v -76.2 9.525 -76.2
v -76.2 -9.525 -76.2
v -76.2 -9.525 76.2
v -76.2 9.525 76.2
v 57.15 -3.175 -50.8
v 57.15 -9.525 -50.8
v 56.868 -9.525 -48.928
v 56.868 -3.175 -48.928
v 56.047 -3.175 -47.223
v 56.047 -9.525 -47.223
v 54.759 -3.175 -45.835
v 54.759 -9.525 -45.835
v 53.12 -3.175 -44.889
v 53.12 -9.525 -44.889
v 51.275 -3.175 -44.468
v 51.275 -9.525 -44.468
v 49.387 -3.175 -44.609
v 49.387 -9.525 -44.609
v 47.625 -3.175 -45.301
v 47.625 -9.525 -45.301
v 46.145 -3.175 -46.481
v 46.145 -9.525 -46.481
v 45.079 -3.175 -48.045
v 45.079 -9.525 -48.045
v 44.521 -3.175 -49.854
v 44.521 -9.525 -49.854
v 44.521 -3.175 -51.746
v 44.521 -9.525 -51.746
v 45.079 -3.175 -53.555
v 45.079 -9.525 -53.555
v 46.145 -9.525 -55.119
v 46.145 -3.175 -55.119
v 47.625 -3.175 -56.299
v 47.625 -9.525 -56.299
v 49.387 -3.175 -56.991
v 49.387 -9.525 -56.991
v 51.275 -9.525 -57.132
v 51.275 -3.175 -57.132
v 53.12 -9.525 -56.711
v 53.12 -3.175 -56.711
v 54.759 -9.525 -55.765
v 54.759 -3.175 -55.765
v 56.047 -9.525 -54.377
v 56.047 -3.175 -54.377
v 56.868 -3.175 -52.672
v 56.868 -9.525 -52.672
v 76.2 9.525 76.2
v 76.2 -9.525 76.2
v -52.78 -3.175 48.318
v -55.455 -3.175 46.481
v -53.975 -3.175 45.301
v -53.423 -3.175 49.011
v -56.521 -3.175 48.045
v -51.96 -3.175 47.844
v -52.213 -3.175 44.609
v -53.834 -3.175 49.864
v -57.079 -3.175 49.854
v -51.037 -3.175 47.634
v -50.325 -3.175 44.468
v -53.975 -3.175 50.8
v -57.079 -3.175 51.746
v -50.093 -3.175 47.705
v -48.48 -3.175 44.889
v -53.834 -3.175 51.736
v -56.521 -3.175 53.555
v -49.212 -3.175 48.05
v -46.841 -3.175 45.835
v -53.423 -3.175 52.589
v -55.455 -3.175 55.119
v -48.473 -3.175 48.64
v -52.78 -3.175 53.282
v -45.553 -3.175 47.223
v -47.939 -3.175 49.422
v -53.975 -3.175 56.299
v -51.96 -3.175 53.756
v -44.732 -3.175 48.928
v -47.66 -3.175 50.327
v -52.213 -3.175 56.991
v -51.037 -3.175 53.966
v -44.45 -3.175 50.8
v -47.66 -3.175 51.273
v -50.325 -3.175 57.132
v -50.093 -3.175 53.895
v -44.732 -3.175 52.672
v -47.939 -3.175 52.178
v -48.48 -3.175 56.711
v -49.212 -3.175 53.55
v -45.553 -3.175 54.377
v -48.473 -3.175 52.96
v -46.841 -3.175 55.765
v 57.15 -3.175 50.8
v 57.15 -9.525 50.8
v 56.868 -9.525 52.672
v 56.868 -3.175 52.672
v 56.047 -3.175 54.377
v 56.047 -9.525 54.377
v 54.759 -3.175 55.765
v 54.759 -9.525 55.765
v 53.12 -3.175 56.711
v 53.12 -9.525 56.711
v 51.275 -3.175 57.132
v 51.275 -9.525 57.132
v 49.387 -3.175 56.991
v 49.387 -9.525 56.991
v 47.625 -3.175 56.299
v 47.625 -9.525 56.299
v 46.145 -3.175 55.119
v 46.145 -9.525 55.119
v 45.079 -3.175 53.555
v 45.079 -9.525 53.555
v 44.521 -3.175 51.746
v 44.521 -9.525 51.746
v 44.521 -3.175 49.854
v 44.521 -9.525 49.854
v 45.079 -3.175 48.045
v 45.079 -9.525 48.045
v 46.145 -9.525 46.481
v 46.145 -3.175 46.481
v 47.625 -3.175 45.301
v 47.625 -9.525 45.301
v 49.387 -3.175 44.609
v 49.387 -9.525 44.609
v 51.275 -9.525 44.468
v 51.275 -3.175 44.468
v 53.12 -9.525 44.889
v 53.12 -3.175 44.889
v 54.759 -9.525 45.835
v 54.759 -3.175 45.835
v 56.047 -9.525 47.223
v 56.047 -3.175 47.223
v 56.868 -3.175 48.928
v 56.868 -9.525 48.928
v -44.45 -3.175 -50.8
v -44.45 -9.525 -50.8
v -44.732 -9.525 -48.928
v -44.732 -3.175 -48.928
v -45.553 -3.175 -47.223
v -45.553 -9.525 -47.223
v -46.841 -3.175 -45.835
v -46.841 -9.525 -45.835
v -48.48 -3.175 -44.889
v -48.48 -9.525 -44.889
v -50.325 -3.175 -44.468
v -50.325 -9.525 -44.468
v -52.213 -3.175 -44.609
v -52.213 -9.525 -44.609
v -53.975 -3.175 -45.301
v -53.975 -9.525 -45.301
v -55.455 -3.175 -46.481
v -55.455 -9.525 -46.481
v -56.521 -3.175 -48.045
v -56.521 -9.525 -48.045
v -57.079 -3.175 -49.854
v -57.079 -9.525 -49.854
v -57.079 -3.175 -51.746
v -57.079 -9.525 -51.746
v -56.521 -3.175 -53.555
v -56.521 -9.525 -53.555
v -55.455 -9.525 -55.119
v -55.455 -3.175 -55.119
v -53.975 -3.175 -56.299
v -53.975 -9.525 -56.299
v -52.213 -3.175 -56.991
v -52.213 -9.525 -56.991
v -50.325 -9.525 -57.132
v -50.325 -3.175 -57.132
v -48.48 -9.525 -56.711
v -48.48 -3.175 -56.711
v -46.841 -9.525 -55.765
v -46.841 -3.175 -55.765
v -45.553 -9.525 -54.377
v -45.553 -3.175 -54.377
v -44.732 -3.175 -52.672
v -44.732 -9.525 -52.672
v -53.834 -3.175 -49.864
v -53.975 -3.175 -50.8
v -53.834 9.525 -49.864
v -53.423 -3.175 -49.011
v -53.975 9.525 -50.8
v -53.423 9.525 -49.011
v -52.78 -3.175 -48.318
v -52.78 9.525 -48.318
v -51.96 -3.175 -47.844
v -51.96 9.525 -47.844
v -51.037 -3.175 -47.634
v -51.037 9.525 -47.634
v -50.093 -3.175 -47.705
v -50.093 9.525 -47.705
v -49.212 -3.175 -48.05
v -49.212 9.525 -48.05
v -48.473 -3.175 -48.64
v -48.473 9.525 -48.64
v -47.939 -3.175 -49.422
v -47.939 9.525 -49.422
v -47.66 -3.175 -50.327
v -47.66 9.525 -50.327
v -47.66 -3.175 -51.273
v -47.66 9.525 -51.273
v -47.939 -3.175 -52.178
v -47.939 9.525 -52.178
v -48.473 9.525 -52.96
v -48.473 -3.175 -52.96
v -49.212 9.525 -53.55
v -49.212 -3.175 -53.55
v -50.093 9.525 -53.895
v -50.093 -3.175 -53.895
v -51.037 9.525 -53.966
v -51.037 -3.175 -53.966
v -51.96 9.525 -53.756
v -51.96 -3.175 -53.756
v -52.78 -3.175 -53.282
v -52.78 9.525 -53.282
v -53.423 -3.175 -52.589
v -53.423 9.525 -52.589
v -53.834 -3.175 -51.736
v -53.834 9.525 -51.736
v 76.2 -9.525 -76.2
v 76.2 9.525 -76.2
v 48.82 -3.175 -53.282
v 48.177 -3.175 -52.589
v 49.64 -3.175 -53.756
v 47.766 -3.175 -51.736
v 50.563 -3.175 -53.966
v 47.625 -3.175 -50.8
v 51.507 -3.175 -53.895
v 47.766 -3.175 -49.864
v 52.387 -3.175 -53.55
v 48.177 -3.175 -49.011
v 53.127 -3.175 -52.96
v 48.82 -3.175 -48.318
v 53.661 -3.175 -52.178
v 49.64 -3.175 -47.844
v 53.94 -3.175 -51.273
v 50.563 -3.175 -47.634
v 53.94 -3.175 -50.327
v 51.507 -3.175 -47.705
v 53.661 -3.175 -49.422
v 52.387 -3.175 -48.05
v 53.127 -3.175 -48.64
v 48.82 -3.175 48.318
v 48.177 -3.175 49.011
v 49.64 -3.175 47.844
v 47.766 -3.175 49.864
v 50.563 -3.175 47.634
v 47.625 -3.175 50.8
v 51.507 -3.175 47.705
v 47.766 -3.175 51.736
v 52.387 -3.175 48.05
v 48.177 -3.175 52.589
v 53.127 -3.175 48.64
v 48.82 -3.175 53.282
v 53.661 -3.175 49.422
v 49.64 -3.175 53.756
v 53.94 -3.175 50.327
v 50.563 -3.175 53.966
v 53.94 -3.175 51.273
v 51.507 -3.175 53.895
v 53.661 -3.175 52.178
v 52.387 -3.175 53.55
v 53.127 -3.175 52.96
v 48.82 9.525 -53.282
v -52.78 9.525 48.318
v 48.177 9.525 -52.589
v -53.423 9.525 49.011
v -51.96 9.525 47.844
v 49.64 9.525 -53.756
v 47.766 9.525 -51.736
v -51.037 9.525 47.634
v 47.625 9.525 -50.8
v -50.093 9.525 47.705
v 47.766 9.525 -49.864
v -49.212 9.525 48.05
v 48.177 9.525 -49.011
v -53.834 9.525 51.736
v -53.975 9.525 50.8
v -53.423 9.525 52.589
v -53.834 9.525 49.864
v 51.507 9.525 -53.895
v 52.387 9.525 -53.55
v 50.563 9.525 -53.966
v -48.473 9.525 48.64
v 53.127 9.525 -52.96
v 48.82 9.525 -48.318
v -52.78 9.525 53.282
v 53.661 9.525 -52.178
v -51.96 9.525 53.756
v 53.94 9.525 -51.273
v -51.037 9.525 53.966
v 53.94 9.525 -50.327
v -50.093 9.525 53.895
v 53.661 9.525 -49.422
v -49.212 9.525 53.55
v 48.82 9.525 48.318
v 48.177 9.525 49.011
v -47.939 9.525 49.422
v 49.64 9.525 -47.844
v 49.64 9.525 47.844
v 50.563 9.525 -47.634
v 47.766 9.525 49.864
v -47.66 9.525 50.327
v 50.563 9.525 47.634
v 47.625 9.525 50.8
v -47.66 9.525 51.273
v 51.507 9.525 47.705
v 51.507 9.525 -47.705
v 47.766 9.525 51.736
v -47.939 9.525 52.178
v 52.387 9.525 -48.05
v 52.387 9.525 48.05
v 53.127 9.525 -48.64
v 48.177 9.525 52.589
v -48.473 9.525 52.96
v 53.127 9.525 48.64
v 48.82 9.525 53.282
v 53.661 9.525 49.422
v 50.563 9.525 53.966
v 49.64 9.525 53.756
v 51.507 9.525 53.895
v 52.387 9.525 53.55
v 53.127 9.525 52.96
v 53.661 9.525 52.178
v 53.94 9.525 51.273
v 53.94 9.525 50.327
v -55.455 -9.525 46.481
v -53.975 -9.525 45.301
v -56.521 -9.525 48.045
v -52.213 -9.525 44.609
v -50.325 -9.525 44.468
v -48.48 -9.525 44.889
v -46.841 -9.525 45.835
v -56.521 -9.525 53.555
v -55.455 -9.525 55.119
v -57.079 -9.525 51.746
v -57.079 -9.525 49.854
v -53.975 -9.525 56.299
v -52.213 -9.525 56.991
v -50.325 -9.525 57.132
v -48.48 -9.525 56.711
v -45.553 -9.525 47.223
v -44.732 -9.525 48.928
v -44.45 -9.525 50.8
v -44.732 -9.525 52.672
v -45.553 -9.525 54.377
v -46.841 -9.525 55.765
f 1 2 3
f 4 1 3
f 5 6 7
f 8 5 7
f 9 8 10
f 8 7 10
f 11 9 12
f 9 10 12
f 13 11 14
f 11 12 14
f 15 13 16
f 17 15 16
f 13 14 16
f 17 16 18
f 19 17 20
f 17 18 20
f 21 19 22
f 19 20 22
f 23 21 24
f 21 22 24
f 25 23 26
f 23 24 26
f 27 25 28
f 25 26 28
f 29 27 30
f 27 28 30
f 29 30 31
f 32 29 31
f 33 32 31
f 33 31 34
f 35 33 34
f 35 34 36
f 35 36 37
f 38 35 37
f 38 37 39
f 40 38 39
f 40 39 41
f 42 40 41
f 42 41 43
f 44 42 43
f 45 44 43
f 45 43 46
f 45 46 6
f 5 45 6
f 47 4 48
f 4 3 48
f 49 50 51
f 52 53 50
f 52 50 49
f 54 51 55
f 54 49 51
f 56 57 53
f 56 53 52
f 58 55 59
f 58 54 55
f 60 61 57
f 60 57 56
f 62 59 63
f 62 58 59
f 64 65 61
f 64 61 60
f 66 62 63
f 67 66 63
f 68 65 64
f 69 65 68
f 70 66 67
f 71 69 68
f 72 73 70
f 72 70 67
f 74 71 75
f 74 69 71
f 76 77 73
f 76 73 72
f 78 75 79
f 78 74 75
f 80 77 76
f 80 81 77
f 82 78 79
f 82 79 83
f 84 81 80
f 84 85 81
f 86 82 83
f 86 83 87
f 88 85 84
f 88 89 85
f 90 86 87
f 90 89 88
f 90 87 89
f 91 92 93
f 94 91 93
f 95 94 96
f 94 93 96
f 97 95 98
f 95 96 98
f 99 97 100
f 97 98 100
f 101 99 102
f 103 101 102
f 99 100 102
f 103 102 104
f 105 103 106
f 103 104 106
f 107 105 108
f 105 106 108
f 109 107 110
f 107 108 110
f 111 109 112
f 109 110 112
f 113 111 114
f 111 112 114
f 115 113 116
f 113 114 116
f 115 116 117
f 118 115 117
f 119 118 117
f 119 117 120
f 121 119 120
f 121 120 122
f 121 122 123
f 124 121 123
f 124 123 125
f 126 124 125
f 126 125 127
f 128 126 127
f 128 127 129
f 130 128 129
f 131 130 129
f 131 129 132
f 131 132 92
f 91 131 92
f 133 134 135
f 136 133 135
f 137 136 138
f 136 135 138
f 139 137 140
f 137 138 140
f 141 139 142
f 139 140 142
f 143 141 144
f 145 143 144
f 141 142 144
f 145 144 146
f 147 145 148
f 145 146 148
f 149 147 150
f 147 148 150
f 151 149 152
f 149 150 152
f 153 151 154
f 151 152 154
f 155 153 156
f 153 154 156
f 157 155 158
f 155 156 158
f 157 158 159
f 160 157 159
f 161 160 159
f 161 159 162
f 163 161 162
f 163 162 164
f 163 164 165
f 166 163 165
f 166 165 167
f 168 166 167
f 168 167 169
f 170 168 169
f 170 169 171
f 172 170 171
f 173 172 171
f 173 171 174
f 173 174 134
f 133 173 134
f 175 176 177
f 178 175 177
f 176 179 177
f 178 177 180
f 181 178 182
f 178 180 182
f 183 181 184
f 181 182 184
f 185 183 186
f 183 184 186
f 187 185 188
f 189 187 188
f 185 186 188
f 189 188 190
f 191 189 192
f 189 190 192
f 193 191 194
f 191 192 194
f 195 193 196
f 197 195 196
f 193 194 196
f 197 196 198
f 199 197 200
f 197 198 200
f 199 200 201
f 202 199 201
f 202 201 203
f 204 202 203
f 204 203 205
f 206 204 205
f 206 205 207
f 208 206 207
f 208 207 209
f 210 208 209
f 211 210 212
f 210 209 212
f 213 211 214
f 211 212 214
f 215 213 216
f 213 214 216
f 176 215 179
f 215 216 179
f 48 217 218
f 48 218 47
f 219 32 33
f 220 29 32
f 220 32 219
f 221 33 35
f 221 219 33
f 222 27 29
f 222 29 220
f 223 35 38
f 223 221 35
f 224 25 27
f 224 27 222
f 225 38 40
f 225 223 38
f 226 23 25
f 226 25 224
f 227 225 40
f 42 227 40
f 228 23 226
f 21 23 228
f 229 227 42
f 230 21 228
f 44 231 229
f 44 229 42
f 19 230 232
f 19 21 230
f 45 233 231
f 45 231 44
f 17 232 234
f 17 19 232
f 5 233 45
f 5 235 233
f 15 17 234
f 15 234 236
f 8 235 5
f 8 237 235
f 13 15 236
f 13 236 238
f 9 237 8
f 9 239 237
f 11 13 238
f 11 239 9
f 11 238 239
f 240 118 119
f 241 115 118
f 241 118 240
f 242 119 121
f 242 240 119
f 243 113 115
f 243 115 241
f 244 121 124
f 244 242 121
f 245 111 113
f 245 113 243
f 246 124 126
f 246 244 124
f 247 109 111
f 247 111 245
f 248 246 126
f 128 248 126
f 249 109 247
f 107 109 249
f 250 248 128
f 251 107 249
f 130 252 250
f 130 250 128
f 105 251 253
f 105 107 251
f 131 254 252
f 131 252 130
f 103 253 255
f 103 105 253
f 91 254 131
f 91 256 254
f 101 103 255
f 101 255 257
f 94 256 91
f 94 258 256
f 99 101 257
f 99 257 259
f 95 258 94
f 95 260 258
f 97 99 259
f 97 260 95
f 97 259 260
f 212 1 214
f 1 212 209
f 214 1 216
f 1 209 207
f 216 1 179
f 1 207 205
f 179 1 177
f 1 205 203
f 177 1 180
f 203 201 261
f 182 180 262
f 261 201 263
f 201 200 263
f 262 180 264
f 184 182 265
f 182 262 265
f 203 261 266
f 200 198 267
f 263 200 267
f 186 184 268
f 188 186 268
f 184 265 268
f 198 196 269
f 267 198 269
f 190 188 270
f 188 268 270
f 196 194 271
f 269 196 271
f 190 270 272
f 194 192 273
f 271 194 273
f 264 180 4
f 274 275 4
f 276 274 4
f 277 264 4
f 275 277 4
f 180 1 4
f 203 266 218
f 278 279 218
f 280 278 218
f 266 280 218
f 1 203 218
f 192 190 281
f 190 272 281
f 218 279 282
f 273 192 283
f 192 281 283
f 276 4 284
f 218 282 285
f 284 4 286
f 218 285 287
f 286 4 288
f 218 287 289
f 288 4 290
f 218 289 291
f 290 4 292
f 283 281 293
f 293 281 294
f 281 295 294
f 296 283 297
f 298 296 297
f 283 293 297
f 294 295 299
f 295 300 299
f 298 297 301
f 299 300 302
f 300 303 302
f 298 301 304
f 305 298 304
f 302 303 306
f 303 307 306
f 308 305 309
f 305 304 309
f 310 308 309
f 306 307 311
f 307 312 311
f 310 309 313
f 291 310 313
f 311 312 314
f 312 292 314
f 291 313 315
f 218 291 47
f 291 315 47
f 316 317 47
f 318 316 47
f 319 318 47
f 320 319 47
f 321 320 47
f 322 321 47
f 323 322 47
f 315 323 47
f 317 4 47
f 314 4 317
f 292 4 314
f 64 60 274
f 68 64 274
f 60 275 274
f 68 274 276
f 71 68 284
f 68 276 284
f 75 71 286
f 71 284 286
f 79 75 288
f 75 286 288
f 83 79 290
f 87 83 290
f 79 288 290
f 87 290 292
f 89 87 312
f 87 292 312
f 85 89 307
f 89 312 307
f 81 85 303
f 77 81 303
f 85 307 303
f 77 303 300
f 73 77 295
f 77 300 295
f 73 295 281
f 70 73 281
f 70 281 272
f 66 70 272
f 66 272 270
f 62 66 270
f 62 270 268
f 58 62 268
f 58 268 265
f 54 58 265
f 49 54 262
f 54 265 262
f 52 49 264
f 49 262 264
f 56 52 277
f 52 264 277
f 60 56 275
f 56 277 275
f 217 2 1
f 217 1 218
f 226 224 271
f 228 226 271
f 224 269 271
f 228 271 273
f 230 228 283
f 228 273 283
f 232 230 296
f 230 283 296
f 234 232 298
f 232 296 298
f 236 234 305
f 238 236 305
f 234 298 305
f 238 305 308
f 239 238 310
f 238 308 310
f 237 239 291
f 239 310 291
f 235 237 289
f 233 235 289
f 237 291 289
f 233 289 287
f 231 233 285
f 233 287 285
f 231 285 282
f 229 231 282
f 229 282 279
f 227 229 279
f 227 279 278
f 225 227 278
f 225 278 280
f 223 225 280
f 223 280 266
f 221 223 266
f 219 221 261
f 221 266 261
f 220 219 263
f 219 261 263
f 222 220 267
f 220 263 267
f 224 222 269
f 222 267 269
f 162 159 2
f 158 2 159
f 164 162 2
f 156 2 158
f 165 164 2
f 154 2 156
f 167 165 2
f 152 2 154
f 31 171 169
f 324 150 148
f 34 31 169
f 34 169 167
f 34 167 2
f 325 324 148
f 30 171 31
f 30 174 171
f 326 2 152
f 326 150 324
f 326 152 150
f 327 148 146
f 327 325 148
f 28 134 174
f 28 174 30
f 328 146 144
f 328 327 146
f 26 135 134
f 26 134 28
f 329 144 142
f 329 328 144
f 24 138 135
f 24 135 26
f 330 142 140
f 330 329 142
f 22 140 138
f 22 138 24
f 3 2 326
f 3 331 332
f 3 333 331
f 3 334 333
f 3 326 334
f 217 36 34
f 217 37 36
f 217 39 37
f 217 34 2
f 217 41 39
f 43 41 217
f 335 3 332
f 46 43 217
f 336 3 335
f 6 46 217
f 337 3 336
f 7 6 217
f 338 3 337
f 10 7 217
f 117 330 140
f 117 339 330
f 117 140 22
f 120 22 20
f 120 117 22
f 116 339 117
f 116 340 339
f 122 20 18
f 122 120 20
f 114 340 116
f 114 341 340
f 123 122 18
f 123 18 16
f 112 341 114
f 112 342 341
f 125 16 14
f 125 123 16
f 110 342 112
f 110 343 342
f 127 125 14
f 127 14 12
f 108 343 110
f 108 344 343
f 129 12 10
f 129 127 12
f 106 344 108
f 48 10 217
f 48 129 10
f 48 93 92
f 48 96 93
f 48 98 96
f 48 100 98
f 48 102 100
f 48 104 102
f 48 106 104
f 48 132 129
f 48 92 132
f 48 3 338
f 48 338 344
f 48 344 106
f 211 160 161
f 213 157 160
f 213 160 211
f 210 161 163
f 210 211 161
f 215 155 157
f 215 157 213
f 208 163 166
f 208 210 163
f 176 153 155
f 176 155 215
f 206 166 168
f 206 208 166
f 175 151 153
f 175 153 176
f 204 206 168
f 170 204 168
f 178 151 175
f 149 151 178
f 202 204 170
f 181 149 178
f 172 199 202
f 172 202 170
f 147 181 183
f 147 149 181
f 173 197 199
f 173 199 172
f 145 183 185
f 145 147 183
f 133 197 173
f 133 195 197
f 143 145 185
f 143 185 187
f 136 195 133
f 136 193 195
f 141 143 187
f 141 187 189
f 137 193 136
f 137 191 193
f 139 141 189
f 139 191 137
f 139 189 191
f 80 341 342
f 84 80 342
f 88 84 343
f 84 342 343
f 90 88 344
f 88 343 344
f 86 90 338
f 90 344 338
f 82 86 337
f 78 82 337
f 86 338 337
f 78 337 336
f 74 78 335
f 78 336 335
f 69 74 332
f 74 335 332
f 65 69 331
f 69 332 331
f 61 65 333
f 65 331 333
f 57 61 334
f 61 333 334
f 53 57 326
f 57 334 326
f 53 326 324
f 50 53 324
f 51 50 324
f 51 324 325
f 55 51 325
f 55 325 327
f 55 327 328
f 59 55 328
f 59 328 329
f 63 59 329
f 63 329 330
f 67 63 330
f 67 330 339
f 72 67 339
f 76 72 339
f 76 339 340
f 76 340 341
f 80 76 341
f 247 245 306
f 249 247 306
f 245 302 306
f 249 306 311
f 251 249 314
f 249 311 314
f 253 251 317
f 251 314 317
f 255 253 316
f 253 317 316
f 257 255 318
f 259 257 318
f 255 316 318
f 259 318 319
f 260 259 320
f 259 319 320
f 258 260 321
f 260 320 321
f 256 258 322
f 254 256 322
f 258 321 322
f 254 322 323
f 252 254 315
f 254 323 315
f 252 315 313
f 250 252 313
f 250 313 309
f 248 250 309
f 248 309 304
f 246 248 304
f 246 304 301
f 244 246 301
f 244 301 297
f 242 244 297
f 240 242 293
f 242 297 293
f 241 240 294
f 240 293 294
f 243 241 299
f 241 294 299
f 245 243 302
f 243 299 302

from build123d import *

# Parameters (mm, degrees)
F0_W           = 152.4
F0_H           = 152.4
F1_DEPTH       = 9.525
F3_D           = 6.35
F3_CBORE_D     = 12.7
F3_CBORE_DEPTH = 6.35


with BuildPart() as f1:
    # F0 (on Front) → F1 (new body, symmetric)
    with BuildSketch(Plane.XZ):
        Rectangle(F0_W, F0_H)
    extrude(amount=F1_DEPTH, both=True)

    # F3 (through all)
    with Locations(Plane.XZ.offset(9.525)):
        with Locations((-50.8, 50.8), (50.8, 50.8), (50.8, -50.8), (-50.8, -50.8)):
            CounterBoreHole(F3_D / 2, F3_CBORE_D / 2, F3_CBORE_DEPTH)


solid = f1.part
